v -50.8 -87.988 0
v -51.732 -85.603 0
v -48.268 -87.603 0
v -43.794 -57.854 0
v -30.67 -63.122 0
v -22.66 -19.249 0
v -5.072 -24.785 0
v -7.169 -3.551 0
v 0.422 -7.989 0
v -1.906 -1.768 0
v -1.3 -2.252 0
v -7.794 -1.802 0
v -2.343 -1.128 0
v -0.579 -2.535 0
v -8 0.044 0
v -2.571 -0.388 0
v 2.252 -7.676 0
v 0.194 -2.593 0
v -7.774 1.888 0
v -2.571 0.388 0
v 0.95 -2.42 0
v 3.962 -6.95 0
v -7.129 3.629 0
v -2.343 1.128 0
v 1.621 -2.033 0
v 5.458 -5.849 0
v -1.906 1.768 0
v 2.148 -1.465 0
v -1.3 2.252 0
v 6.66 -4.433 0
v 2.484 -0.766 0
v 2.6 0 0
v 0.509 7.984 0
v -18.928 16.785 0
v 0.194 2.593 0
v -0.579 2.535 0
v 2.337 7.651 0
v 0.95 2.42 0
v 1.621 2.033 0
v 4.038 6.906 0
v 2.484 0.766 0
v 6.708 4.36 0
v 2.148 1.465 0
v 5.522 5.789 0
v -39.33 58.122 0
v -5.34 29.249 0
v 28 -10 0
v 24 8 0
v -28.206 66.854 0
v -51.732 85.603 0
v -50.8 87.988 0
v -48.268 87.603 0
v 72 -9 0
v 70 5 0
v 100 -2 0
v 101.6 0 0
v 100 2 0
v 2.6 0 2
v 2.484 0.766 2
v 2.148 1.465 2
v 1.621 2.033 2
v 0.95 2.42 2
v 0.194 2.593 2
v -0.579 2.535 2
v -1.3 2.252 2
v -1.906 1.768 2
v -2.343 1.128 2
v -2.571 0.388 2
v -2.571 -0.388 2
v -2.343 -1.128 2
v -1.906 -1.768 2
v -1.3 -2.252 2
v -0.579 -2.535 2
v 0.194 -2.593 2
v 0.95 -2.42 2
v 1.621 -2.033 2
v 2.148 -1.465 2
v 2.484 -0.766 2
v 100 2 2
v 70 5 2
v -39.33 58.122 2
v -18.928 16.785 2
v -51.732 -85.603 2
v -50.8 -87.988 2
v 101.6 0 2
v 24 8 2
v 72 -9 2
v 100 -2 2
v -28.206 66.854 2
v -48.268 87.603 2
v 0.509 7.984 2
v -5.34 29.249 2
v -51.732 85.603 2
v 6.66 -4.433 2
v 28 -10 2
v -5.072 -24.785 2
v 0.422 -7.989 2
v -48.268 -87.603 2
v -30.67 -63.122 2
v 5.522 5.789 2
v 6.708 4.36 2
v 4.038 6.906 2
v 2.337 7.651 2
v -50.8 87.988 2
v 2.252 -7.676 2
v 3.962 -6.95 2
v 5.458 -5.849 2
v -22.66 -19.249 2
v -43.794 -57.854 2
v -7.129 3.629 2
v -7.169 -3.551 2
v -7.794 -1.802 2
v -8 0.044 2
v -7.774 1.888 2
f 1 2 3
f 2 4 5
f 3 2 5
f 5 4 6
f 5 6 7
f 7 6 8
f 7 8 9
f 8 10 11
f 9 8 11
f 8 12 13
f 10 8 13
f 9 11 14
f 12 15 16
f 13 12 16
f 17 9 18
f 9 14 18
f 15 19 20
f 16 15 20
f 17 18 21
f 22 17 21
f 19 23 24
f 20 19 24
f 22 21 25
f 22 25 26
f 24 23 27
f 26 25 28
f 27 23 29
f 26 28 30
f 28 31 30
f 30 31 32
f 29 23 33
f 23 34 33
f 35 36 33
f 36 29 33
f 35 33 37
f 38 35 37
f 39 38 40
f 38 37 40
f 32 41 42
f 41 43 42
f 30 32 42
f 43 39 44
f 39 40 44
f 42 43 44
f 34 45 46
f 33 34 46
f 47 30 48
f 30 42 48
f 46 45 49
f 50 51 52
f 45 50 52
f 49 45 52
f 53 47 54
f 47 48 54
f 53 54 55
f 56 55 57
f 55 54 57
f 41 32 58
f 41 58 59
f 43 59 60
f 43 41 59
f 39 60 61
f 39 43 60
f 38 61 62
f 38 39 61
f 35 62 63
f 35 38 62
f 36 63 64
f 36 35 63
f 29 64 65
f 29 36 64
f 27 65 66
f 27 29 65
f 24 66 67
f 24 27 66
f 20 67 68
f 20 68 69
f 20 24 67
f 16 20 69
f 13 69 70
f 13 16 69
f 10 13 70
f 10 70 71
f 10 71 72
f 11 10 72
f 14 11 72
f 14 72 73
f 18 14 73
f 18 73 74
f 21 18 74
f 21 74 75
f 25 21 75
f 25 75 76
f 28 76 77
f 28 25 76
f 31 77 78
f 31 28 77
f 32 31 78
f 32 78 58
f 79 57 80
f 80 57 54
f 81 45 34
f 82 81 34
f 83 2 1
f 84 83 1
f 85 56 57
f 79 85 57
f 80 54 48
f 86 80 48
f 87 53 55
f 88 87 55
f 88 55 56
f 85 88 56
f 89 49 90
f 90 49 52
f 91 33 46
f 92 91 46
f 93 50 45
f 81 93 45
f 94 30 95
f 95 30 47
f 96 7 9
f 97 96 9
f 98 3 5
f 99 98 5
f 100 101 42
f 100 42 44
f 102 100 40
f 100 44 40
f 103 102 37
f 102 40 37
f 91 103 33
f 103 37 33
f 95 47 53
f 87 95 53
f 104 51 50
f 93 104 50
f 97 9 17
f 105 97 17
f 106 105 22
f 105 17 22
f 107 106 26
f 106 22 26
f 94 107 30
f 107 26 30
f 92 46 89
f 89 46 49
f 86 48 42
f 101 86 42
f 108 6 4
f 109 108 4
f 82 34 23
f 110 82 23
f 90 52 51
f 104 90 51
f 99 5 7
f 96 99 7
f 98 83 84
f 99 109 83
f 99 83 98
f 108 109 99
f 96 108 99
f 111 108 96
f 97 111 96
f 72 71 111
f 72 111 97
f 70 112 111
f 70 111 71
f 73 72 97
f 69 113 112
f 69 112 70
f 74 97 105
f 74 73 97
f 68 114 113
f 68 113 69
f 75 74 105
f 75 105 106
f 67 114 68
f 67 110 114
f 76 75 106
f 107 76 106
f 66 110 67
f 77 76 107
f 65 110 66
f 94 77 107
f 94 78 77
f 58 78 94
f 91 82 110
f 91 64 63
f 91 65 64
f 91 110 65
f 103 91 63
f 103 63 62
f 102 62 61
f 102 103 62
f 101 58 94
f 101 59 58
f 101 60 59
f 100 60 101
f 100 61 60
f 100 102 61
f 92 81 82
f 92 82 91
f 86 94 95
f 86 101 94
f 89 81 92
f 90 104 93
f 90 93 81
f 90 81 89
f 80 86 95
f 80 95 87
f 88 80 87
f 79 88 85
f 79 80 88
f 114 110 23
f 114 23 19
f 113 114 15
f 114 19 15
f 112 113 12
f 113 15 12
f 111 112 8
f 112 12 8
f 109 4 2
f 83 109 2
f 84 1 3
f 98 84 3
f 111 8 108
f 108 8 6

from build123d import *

# Parameters (mm, degrees)
SKETCH_1_R          = 8
SKETCH_1_R_2        = 2.6
EXTRUDE_215_DEPTH   = 2
EXTRUDE_8_120_DEPTH = 2


with BuildPart() as part:
    # 草图1 → Extrude 215 (new body)
    with BuildSketch(Plane.XY):
        Circle(SKETCH_1_R)
        Circle(SKETCH_1_R_2, mode=Mode.SUBTRACT)
    extrude(amount=EXTRUDE_215_DEPTH)

    # 草图2 → 8寸三叶桨轮廓_120度均布 (add)
    with BuildSketch(Plane.XY):
        Polygon((5, -4), (28, -10), (72, -9), (100, -2), (101.6, 0), (100, 2), (70, 5), (24, 8), (5, 4), align=None)
        Polygon((0.964101615, 6.330127019), (-5.339745962, 29.248711306), (-28.205771366, 66.853829072), (-48.267949192, 87.602540378), (-50.8, 87.988181024), (-51.732050808, 85.602540378), (-39.330127019, 58.121778265), (-18.92820323, 16.784609691), (-5.964101615, 2.330127019), align=None)
        Polygon((-5.964101615, -2.330127019), (-22.660254038, -19.248711306), (-43.794228634, -57.853829072), (-51.732050808, -85.602540378), (-50.8, -87.988181024), (-48.267949192, -87.602540378), (-30.669872981, -63.121778265), (-5.07179677, -24.784609691), (0.964101615, -6.330127019), align=None)
    extrude(amount=EXTRUDE_8_120_DEPTH)


solid = part.part
